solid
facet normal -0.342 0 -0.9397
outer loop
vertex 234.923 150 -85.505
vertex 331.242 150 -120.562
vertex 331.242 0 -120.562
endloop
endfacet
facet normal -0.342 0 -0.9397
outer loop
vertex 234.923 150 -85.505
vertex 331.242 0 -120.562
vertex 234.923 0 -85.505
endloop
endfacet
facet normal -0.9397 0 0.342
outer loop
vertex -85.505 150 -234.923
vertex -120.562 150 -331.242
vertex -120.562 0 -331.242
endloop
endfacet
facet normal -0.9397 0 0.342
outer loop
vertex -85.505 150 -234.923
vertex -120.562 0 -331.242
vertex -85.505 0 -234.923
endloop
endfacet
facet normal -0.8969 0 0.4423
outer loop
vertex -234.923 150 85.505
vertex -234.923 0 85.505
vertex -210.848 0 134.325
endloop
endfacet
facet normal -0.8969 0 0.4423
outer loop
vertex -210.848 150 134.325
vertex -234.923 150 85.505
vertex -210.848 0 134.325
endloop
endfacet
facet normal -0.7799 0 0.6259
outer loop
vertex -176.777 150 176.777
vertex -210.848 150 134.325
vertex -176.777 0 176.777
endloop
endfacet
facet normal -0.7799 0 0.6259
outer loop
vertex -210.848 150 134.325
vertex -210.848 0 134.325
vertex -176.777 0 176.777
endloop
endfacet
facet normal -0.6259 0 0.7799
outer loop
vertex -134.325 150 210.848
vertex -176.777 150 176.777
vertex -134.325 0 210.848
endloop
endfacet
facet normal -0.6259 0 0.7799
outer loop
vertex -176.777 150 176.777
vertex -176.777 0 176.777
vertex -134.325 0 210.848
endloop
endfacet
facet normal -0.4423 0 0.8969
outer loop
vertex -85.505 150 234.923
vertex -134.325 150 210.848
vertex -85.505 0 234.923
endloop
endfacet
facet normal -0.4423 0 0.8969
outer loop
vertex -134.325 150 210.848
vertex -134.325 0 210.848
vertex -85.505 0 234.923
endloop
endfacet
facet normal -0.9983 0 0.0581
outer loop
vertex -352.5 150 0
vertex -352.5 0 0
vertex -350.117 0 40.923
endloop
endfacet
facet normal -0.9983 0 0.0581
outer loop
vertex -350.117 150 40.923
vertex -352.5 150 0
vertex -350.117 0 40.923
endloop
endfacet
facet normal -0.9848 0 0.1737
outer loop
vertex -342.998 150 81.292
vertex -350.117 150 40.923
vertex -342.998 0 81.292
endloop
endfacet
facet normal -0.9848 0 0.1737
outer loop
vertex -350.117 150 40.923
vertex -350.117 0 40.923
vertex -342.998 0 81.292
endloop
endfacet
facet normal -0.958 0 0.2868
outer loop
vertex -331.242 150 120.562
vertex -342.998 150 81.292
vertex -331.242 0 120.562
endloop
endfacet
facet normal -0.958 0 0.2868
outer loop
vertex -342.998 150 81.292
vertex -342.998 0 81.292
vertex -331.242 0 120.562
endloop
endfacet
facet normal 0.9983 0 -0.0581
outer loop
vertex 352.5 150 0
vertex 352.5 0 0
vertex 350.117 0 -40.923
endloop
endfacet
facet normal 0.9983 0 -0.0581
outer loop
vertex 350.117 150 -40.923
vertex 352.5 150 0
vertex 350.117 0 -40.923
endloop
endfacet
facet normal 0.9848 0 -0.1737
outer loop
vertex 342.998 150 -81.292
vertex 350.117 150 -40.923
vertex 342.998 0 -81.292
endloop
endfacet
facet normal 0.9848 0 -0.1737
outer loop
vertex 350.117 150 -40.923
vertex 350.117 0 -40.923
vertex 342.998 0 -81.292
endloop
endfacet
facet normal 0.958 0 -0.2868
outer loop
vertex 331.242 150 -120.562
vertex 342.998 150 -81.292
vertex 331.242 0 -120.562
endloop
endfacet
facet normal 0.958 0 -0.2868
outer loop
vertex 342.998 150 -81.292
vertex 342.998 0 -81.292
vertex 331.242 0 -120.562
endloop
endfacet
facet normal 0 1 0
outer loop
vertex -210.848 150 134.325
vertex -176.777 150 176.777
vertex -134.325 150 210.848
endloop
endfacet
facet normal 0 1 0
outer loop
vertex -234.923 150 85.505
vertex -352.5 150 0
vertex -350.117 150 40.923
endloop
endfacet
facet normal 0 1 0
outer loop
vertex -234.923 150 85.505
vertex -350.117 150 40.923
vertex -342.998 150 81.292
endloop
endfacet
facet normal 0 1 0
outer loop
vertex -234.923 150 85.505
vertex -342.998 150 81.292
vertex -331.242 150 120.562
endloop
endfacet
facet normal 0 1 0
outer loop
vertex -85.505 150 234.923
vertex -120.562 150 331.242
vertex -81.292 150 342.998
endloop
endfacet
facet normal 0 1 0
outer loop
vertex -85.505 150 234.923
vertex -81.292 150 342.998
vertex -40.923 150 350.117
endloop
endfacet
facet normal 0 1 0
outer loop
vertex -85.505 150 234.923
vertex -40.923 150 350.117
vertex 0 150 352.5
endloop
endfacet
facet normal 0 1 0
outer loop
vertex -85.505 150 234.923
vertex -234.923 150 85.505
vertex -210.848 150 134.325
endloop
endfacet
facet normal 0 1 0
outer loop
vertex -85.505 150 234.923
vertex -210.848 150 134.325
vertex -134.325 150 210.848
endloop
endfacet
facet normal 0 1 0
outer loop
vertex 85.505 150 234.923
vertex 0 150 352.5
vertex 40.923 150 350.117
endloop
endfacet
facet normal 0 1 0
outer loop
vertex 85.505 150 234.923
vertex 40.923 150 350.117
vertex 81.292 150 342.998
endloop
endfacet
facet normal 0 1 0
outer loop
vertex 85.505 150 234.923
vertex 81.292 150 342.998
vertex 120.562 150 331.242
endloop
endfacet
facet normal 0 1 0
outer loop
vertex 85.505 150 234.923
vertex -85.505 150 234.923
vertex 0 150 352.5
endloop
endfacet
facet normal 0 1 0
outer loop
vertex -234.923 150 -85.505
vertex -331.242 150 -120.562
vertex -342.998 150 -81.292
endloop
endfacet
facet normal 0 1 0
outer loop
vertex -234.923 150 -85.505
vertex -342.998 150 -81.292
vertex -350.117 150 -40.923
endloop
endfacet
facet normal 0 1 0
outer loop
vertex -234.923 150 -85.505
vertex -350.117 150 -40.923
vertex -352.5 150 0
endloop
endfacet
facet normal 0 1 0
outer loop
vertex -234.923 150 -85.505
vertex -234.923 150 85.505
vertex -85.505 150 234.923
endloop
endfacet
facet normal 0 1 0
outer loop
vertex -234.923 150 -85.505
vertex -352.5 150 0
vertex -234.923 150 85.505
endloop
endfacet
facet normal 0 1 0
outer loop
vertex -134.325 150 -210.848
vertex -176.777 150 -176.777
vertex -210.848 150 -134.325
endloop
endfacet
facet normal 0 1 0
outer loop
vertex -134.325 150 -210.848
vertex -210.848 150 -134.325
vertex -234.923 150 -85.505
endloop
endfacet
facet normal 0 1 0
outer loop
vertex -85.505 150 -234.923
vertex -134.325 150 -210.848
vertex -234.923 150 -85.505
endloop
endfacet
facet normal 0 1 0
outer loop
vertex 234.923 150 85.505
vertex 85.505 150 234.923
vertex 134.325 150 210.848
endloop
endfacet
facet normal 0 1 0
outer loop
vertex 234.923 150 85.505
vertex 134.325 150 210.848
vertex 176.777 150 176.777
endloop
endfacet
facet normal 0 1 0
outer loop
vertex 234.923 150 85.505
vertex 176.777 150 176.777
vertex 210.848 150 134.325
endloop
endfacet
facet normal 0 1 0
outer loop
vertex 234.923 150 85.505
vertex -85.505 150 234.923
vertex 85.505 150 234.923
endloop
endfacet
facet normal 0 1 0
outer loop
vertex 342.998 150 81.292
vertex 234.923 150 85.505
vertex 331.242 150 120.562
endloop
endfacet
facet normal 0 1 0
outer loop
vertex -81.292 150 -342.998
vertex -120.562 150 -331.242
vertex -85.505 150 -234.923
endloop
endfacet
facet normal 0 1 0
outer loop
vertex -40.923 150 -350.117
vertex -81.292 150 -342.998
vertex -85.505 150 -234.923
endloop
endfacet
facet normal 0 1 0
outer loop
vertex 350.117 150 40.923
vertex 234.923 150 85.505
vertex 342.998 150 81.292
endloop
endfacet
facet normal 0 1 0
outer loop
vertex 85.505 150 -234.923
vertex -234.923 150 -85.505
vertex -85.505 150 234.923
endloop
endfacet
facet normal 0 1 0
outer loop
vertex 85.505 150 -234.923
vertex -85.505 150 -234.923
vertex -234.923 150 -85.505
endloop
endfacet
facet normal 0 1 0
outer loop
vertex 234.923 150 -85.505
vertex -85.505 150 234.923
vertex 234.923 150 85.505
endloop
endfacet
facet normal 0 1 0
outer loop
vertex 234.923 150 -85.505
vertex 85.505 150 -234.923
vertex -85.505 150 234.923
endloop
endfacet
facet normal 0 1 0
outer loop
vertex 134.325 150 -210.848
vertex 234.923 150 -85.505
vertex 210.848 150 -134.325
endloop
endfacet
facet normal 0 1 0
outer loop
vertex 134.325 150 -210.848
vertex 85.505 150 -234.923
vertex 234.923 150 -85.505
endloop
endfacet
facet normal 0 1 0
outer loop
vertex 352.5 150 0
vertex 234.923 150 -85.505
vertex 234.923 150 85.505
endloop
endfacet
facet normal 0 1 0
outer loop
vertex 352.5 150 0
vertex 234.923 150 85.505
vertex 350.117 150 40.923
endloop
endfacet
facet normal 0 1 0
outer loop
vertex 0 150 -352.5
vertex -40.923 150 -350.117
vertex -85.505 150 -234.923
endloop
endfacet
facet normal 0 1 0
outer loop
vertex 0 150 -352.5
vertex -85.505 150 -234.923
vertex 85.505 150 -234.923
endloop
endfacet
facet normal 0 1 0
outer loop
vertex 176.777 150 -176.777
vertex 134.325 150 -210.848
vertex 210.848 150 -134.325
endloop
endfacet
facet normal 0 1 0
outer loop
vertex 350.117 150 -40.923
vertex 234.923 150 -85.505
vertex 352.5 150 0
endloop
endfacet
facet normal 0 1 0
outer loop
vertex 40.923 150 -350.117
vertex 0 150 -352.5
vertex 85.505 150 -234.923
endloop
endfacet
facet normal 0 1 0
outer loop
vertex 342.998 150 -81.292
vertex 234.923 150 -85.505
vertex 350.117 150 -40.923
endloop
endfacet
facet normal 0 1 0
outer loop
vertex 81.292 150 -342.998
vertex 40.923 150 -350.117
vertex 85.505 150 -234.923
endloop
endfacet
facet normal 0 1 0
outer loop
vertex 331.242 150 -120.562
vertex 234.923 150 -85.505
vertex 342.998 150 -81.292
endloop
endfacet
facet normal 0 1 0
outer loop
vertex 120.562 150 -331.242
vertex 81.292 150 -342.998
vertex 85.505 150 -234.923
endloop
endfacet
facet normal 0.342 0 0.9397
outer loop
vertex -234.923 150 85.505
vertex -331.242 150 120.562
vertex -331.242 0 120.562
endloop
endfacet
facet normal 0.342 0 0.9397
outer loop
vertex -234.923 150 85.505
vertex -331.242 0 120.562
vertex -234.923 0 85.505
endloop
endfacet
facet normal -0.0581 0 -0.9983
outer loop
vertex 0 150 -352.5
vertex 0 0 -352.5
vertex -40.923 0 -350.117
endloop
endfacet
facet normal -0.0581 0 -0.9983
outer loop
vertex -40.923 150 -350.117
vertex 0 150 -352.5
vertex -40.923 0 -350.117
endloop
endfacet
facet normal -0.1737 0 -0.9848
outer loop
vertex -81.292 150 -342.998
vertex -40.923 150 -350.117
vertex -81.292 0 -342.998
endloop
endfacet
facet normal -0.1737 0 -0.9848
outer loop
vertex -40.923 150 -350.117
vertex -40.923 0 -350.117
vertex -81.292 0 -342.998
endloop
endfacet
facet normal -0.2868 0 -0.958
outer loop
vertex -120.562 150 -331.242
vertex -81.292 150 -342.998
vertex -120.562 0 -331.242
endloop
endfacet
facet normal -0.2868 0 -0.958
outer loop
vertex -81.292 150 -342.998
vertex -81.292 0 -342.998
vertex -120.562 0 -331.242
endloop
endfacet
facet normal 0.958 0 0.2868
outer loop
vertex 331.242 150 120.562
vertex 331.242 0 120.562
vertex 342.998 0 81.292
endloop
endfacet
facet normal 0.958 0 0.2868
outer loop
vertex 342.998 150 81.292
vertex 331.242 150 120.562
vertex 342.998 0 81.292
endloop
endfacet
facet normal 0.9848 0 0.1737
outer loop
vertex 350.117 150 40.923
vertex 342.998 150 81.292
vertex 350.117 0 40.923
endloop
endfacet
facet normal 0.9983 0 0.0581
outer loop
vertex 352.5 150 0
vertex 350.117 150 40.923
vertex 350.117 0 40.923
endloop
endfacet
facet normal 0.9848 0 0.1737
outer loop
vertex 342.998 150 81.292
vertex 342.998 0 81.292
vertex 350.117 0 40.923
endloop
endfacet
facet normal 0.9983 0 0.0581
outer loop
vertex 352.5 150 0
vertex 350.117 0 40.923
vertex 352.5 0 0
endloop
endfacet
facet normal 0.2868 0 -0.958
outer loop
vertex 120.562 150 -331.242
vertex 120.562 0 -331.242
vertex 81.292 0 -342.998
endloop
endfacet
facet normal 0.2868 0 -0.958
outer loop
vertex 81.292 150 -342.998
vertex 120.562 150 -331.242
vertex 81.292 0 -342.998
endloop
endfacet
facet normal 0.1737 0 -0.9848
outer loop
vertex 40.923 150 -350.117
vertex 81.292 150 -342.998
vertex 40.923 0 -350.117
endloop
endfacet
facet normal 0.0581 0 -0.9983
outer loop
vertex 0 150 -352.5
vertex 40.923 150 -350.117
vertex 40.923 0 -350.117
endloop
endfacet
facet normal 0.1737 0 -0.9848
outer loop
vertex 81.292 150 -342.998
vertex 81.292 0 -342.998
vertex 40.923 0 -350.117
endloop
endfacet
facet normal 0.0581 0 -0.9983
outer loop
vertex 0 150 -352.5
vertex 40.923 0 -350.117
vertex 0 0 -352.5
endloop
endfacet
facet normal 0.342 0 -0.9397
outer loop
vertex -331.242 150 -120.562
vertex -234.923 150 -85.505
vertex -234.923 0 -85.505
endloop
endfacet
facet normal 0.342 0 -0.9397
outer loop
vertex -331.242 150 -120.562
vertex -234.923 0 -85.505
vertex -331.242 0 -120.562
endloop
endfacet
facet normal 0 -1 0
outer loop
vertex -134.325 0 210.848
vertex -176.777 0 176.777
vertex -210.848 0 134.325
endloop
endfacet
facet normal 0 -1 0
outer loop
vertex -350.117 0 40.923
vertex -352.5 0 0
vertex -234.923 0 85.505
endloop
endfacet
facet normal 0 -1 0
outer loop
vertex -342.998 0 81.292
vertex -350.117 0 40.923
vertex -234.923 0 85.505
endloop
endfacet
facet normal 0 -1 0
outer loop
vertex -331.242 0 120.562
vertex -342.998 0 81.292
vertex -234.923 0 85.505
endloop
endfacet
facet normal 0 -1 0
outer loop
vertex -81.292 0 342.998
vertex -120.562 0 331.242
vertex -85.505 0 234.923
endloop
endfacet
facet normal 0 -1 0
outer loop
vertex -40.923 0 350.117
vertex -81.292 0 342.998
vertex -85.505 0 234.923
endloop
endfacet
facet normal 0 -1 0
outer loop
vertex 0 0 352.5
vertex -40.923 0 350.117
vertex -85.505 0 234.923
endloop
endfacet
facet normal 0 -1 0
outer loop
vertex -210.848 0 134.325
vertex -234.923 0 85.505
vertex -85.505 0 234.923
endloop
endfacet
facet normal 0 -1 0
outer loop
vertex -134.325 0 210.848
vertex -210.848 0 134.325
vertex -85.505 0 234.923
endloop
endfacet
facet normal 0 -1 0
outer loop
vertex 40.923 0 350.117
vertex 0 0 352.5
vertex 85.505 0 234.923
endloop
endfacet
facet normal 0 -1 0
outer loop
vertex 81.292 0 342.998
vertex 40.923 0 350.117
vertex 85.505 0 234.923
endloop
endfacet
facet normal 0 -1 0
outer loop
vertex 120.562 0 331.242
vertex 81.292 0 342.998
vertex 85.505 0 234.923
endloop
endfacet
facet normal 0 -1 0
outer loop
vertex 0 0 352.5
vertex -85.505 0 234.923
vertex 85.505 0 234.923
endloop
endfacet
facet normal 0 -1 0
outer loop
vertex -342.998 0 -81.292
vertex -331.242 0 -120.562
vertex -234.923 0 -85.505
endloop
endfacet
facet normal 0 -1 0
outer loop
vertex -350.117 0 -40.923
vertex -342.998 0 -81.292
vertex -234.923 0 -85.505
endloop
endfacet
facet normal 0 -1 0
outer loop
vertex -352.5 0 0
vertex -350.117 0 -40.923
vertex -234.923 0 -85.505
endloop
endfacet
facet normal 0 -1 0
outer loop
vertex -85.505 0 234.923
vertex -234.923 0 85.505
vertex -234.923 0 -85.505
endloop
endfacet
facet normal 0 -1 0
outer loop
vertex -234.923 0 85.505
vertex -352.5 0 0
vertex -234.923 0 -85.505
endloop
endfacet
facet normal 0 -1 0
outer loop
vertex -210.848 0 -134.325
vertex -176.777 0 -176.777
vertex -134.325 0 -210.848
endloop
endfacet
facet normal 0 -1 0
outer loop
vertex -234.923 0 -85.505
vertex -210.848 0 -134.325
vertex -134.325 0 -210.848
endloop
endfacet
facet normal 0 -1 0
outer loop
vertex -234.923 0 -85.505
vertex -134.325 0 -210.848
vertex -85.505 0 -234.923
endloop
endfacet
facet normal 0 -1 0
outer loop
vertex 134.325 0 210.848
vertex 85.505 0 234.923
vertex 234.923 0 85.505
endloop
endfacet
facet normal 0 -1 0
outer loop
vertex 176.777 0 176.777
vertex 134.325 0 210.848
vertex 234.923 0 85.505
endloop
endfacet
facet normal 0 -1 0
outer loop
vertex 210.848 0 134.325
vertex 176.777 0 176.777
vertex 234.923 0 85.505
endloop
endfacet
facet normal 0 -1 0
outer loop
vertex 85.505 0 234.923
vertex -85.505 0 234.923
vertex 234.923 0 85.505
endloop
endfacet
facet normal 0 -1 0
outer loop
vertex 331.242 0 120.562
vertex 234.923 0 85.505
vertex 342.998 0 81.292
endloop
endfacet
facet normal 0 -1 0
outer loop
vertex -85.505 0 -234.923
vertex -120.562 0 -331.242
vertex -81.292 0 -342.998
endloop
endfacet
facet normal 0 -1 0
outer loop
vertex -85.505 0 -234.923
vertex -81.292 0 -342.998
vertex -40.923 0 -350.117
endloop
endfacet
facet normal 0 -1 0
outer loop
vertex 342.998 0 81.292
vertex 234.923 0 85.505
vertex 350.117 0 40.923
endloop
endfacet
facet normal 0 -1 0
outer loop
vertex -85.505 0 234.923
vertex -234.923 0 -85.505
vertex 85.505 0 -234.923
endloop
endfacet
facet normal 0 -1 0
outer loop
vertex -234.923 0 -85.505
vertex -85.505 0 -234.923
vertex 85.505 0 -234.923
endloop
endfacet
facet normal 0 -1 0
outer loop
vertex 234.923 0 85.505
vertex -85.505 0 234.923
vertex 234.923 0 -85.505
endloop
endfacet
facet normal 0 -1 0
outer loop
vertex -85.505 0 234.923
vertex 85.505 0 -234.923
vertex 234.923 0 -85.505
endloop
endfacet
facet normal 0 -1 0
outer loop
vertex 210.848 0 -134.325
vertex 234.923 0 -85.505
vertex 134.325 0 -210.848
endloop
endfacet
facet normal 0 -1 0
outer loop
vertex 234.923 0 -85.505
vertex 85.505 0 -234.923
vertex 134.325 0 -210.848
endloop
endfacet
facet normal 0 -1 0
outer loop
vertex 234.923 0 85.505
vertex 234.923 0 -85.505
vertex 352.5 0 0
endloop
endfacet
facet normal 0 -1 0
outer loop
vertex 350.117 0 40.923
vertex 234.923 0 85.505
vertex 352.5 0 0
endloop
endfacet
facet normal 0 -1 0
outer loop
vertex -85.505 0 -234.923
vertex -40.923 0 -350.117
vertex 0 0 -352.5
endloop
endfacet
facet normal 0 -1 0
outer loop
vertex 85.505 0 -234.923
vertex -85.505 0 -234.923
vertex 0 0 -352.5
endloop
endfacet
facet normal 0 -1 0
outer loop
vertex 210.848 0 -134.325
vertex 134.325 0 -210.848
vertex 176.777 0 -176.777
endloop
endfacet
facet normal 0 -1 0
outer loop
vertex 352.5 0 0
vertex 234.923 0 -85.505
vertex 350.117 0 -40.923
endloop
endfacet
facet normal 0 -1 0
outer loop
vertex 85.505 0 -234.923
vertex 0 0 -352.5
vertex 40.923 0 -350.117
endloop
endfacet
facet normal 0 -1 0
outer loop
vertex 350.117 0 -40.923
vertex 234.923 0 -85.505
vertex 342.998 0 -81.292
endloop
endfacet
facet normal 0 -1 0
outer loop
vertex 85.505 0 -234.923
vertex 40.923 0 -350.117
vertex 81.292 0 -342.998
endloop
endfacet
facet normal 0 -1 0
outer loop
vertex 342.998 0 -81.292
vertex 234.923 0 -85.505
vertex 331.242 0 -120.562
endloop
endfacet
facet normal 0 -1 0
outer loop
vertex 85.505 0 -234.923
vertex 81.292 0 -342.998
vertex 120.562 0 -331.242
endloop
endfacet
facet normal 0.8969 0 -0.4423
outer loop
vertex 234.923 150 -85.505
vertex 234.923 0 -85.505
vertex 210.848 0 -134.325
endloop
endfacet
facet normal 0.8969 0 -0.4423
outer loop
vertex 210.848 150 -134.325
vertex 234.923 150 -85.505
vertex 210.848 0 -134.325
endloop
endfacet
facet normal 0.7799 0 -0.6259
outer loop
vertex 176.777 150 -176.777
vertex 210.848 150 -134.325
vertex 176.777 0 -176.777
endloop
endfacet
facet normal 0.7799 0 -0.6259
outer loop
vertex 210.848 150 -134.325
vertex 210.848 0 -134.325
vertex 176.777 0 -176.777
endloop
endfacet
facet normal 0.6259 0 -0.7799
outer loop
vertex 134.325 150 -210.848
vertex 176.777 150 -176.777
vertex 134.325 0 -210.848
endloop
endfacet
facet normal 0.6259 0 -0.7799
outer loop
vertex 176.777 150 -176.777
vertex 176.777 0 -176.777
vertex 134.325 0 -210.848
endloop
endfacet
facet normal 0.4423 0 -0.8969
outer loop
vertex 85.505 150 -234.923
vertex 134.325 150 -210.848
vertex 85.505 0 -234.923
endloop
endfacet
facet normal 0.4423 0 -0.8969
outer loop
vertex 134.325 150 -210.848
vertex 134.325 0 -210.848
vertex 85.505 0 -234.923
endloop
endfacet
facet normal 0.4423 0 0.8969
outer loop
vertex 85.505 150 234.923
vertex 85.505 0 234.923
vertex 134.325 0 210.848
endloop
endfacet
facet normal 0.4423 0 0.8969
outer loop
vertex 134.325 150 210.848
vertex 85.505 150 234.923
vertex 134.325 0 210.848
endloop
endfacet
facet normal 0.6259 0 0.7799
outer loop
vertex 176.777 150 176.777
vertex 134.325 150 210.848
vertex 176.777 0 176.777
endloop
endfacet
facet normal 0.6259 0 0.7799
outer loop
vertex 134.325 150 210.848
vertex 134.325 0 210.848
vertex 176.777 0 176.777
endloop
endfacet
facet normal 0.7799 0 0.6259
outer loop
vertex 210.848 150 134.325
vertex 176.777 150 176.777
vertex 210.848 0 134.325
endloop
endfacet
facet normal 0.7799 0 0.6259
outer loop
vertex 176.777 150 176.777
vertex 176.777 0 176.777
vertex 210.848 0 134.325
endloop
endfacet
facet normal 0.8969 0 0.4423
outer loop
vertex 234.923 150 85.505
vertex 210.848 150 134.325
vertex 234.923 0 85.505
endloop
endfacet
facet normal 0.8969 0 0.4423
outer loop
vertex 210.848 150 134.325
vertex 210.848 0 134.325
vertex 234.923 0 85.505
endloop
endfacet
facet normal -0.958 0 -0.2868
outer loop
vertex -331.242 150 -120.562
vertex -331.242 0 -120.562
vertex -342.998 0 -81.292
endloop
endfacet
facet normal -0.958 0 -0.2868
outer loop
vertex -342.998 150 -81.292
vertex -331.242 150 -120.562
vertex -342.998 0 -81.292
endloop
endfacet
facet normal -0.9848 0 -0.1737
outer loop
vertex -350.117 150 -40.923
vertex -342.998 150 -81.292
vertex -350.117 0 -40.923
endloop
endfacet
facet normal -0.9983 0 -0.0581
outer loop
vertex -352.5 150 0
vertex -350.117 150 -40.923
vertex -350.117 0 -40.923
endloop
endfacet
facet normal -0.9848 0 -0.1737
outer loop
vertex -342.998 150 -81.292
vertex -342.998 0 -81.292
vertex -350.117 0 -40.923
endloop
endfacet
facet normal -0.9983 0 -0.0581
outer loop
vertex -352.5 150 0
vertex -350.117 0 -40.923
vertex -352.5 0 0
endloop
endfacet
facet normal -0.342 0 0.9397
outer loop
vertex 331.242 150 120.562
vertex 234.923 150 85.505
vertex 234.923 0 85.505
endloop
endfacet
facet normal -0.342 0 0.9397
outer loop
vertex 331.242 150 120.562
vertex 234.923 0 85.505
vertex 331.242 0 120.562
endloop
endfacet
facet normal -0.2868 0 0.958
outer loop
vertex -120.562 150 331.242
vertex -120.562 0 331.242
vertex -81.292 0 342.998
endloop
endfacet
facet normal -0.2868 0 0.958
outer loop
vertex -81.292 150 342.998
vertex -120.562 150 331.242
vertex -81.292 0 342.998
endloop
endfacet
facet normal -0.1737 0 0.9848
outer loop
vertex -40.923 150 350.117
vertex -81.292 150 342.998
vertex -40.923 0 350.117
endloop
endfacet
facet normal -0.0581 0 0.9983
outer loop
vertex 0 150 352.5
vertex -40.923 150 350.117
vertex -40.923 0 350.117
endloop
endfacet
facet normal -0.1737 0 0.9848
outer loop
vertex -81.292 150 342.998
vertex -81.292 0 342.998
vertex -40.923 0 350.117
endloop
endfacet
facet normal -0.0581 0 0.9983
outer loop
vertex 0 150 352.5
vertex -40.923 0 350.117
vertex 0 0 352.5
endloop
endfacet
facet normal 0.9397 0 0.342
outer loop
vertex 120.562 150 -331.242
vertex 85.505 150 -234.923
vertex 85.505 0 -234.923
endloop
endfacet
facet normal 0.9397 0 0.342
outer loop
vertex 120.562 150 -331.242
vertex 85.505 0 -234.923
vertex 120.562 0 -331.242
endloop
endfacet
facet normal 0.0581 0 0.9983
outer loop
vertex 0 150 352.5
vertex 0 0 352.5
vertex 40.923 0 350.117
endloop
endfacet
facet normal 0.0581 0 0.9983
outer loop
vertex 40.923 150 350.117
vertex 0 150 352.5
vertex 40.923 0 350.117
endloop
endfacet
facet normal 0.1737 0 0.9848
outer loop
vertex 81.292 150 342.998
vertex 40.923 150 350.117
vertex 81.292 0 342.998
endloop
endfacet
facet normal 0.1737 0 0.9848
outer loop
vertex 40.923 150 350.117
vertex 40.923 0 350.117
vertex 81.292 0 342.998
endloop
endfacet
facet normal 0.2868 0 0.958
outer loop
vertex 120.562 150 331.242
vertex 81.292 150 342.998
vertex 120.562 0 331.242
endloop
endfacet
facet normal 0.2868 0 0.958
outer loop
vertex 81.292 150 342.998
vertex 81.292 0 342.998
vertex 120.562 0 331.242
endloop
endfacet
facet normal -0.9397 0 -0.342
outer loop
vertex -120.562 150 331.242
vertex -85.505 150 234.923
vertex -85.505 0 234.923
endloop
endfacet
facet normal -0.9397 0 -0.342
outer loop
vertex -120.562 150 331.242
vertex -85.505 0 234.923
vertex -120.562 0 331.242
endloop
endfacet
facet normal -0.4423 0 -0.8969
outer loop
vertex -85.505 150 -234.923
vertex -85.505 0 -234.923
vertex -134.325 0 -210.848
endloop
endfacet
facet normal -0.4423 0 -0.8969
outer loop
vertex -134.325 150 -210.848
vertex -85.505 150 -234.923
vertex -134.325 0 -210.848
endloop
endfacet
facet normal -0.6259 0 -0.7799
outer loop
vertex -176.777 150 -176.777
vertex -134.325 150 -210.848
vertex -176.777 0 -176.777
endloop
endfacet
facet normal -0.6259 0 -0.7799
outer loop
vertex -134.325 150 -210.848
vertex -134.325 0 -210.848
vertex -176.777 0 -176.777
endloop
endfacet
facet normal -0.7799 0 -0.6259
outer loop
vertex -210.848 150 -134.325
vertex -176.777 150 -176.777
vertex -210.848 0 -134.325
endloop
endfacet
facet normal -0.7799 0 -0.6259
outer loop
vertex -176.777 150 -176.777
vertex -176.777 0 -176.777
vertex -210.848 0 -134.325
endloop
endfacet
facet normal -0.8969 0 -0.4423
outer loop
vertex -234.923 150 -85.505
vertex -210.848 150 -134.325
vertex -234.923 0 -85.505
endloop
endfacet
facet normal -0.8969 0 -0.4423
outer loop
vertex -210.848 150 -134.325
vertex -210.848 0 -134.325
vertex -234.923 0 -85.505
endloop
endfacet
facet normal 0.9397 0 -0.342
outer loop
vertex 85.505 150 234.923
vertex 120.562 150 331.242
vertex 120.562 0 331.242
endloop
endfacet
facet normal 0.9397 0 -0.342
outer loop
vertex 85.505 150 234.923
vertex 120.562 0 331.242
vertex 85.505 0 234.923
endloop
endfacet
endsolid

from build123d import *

# Parameters (mm, degrees)
EXTRUDE_1_DEPTH = 150


with BuildPart() as part:
    # 草图1 → 凸台-拉伸1 (new body)
    with BuildSketch(Plane(origin=(0, 0, 0), x_dir=(1, 0, 0), z_dir=(0, 1, 0))):
        with BuildLine():
            ThreePointArc((-120.562100522, -331.241648827), (-61.210982628, -347.144732937), (0, -352.5))
            ThreePointArc((0, -352.5), (61.210982628, -347.144732937), (120.562100522, -331.241648827))
            Line((120.562100522, -331.241648827), (85.505035831, -234.923155196))
            ThreePointArc((85.505035831, -234.923155196), (176.776695297, -176.776695297), (234.923155196, -85.505035831))
            Line((234.923155196, -85.505035831), (331.241648827, -120.562100522))
            ThreePointArc((331.241648827, -120.562100522), (347.144732937, -61.210982628), (352.5, 0))
            ThreePointArc((352.5, 0), (347.144732937, 61.210982628), (331.241648827, 120.562100522))
            Line((331.241648827, 120.562100522), (234.923155196, 85.505035831))
            ThreePointArc((234.923155196, 85.505035831), (176.776695297, 176.776695297), (85.505035831, 234.923155196))
            Line((85.505035831, 234.923155196), (120.562100522, 331.241648827))
            ThreePointArc((120.562100522, 331.241648827), (61.210982628, 347.144732937), (0, 352.5))
            ThreePointArc((0, 352.5), (-61.210982628, 347.144732937), (-120.562100522, 331.241648827))
            Line((-120.562100522, 331.241648827), (-85.505035831, 234.923155196))
            ThreePointArc((-85.505035831, 234.923155196), (-176.776695297, 176.776695297), (-234.923155196, 85.505035831))
            Line((-234.923155196, 85.505035831), (-331.241648827, 120.562100522))
            ThreePointArc((-331.241648827, 120.562100522), (-347.144732937, 61.210982628), (-352.5, 0))
            ThreePointArc((-352.5, 0), (-347.144732937, -61.210982628), (-331.241648827, -120.562100522))
            Line((-331.241648827, -120.562100522), (-234.923155196, -85.505035831))
            ThreePointArc((-234.923155196, -85.505035831), (-176.776695297, -176.776695297), (-85.505035831, -234.923155196))
            Line((-85.505035831, -234.923155196), (-120.562100522, -331.241648827))
        make_face()
    extrude(amount=EXTRUDE_1_DEPTH)


solid = part.part
